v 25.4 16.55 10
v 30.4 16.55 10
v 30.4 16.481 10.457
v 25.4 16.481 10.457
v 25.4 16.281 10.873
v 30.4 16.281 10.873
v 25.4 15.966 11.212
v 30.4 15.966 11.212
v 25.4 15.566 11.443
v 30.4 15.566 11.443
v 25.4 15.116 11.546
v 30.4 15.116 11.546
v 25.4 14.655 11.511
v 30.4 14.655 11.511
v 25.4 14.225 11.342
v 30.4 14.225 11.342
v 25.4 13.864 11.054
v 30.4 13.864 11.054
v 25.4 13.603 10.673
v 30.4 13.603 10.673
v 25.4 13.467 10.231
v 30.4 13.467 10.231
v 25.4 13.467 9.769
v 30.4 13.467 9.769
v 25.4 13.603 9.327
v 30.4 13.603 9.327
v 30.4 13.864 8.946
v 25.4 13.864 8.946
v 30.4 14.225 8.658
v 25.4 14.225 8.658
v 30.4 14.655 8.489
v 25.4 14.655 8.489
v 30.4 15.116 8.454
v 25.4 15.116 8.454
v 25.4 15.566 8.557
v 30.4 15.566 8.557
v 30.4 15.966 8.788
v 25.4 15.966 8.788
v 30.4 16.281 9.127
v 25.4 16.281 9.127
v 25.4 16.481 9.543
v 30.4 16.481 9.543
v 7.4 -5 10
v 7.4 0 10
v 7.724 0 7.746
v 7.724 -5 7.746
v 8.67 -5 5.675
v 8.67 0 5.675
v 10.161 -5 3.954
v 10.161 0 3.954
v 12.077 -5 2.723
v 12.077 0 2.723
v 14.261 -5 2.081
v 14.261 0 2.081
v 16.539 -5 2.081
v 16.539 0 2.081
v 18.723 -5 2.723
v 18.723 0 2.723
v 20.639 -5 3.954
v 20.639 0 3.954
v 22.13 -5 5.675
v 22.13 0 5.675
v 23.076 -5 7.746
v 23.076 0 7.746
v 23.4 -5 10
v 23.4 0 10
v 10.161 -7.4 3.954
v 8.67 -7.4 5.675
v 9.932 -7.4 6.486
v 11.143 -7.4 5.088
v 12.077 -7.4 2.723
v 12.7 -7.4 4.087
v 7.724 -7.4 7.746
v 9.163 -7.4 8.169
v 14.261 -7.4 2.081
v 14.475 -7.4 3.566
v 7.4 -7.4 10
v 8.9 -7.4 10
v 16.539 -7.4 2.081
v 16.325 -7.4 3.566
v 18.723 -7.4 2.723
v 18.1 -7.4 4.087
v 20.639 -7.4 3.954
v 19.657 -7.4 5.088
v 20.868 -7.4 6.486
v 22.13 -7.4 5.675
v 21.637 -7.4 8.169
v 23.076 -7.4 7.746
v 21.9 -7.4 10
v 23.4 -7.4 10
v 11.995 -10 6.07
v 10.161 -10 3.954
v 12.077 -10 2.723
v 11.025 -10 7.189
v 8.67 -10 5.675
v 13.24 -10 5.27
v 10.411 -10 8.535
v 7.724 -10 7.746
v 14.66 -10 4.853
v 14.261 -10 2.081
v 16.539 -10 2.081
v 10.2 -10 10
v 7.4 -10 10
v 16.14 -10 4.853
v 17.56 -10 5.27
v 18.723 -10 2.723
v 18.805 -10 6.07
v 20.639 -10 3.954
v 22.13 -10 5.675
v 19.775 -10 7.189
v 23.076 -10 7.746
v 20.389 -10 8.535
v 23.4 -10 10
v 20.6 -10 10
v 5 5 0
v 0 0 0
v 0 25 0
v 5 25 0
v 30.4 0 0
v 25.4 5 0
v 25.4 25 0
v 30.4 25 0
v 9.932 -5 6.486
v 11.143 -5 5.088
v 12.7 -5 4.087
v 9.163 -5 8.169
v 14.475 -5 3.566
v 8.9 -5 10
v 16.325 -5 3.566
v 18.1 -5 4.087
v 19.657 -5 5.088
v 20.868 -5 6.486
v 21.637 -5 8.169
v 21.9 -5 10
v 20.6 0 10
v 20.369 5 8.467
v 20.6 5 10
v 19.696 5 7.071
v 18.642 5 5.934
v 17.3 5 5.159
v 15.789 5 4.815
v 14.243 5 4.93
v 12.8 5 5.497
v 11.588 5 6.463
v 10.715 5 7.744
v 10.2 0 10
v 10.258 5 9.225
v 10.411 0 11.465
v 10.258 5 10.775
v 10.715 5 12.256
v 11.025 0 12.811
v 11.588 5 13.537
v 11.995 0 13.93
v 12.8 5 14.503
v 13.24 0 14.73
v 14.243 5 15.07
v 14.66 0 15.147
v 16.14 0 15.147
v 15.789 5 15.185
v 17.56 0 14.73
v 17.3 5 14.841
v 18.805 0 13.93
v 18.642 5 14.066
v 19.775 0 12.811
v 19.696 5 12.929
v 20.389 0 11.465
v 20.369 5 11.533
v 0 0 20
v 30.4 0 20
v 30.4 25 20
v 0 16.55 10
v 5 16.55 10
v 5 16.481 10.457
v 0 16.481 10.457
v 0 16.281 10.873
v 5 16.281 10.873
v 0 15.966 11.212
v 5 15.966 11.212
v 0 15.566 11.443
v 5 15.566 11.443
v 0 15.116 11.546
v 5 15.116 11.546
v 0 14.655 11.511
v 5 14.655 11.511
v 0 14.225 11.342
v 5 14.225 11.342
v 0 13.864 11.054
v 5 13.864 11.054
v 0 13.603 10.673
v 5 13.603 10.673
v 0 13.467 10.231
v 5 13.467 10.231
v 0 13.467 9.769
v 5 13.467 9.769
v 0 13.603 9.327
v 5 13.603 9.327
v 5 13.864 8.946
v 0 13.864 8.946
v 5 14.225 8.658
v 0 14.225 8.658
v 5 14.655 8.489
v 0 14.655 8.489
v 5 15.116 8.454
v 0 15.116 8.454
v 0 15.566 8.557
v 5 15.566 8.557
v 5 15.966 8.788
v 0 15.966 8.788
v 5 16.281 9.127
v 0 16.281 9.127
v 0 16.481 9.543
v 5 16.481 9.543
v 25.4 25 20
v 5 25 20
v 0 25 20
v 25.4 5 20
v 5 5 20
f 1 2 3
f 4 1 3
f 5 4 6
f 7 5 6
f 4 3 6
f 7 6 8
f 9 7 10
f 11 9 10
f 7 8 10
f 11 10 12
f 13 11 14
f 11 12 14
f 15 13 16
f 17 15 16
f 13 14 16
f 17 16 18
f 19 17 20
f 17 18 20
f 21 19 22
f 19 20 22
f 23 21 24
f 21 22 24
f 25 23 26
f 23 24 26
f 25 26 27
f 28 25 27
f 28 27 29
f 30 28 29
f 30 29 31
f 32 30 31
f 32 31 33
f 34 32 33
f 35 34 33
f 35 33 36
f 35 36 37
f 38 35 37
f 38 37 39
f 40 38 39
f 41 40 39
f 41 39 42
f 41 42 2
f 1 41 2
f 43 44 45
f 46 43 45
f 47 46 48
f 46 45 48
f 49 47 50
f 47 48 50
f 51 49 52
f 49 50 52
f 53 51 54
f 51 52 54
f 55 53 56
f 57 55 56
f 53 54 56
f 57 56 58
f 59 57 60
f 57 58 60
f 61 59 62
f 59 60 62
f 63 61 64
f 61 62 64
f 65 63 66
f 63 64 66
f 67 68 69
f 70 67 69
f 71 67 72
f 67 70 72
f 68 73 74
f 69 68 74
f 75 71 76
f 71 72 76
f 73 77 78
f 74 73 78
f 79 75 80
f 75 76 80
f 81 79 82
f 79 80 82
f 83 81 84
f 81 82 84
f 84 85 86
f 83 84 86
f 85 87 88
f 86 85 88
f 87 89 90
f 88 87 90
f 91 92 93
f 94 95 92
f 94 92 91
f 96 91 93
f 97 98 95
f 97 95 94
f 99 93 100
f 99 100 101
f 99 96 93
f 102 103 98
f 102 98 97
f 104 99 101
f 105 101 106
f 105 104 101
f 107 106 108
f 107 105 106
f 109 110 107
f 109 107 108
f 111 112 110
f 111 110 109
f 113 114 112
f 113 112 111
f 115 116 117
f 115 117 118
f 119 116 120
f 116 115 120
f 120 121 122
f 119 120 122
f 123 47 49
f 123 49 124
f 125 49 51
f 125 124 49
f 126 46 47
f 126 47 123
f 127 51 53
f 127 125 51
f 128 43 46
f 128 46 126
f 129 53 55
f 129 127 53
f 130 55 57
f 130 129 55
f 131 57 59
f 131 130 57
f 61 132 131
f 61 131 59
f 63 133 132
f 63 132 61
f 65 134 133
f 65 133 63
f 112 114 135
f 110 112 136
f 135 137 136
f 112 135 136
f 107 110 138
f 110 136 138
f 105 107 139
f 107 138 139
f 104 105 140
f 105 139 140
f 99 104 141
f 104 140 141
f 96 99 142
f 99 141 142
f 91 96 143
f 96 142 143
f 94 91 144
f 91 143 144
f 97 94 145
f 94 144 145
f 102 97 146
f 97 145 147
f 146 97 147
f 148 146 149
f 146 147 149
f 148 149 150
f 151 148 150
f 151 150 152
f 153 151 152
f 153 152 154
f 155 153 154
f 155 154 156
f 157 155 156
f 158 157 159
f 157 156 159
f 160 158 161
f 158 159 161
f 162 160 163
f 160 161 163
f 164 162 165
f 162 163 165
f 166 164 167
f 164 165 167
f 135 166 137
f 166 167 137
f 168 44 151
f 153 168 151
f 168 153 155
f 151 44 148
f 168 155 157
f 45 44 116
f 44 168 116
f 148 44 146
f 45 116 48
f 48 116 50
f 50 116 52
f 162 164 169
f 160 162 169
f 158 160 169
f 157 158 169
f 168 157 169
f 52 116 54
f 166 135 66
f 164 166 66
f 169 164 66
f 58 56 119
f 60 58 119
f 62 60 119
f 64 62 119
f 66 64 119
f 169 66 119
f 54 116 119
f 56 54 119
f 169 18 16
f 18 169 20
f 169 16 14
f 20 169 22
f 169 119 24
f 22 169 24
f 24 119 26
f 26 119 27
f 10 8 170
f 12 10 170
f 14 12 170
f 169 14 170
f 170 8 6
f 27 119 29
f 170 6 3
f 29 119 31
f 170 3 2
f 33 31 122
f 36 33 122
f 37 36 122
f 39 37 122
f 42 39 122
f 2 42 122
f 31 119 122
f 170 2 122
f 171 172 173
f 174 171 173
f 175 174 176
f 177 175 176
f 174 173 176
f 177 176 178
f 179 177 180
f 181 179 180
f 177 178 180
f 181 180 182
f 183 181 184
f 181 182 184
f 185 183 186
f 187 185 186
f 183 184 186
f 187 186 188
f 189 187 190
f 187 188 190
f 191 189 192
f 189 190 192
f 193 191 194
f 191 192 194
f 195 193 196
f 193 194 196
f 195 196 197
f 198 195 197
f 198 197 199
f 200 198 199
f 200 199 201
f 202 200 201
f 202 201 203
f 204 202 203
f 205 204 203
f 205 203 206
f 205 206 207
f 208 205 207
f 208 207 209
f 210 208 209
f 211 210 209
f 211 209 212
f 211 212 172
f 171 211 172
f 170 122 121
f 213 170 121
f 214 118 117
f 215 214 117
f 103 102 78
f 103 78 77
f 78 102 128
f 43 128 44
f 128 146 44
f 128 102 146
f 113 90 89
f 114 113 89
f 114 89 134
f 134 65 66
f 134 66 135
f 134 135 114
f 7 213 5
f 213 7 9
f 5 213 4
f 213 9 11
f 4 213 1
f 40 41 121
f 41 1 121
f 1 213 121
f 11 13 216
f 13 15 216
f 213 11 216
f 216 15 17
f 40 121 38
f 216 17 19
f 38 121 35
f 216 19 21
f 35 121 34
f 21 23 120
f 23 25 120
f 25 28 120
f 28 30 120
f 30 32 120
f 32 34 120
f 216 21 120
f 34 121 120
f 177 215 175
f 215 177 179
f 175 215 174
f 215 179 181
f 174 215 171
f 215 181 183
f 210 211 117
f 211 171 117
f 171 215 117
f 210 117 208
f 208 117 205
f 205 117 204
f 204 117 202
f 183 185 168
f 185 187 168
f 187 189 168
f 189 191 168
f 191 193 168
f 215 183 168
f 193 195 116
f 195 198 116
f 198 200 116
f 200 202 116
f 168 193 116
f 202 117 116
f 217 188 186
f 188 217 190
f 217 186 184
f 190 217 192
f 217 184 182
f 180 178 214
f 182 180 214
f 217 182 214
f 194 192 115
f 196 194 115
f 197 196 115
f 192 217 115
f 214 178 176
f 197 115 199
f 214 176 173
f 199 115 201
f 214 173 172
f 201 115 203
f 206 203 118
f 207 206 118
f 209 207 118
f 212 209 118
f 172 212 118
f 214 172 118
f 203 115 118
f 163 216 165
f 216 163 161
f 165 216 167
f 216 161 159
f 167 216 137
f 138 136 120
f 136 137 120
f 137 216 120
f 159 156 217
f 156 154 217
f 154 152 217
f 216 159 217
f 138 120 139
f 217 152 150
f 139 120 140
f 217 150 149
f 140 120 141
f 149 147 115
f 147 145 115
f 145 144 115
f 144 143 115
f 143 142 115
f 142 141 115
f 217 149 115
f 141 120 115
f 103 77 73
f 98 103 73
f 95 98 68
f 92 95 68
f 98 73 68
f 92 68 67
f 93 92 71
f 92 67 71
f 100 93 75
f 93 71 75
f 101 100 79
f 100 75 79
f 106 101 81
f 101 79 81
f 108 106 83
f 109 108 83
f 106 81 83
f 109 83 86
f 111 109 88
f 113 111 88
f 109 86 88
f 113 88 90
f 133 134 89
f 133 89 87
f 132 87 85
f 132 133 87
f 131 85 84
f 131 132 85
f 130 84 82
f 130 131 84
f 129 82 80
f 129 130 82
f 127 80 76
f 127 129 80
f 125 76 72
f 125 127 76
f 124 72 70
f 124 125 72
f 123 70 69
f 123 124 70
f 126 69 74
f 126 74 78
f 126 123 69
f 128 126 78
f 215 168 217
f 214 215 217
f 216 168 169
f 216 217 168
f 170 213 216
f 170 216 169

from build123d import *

# Parameters (mm, degrees)
F1_DEPTH  = 20
F2_R      = 5.2
F3_DEPTH  = 25
F5_DEPTH  = 10
F8_DEPTH  = 2.4
F9_R      = 1.55
F10_DEPTH = 40


with BuildPart() as f1:
    # F0 (on Top) → F1 (new body)
    with BuildSketch(Plane.XY):
        Polygon((0, 25), (0, 0), (30.4, 0), (30.4, 25), (25.4, 25), (25.4, 5), (5, 5), (5, 25), align=None)
    extrude(amount=F1_DEPTH)

    # F2 (on face) → F3 (cut)
    with BuildSketch(Plane.XZ):
        with Locations((15.4, 10)):
            Circle(F2_R)
    extrude(amount=-F3_DEPTH, mode=Mode.SUBTRACT)

    # F4 (on face) → F5 (join)
    with BuildSketch(Plane.XZ):
        with BuildLine():
            Line((10.2, 10), (7.4, 10))
            ThreePointArc((7.4, 10), (15.4, 2), (23.4, 10))
            Line((23.4, 10), (20.6, 10))
            ThreePointArc((20.6, 10), (15.4, 4.8), (10.2, 10))
        make_face()
    extrude(amount=F5_DEPTH)

    # F7 (on offset) → F8 (cut)
    with BuildSketch(Plane.XZ.offset(5)):
        with BuildLine():
            Line((23.4, 10), (21.9, 10))
            ThreePointArc((21.9, 10), (15.4, 3.5), (8.9, 10))
            Line((8.9, 10), (7.4, 10))
            ThreePointArc((7.4, 10), (15.4, 2), (23.4, 10))
        make_face()
    extrude(amount=F8_DEPTH, mode=Mode.SUBTRACT)

    # F9 (on face) → F10 (cut)
    with BuildSketch(Plane.YZ.offset(30.4)):
        with Locations((15, 10)):
            Circle(F9_R)
    extrude(amount=-F10_DEPTH, mode=Mode.SUBTRACT)


solid = f1.part
